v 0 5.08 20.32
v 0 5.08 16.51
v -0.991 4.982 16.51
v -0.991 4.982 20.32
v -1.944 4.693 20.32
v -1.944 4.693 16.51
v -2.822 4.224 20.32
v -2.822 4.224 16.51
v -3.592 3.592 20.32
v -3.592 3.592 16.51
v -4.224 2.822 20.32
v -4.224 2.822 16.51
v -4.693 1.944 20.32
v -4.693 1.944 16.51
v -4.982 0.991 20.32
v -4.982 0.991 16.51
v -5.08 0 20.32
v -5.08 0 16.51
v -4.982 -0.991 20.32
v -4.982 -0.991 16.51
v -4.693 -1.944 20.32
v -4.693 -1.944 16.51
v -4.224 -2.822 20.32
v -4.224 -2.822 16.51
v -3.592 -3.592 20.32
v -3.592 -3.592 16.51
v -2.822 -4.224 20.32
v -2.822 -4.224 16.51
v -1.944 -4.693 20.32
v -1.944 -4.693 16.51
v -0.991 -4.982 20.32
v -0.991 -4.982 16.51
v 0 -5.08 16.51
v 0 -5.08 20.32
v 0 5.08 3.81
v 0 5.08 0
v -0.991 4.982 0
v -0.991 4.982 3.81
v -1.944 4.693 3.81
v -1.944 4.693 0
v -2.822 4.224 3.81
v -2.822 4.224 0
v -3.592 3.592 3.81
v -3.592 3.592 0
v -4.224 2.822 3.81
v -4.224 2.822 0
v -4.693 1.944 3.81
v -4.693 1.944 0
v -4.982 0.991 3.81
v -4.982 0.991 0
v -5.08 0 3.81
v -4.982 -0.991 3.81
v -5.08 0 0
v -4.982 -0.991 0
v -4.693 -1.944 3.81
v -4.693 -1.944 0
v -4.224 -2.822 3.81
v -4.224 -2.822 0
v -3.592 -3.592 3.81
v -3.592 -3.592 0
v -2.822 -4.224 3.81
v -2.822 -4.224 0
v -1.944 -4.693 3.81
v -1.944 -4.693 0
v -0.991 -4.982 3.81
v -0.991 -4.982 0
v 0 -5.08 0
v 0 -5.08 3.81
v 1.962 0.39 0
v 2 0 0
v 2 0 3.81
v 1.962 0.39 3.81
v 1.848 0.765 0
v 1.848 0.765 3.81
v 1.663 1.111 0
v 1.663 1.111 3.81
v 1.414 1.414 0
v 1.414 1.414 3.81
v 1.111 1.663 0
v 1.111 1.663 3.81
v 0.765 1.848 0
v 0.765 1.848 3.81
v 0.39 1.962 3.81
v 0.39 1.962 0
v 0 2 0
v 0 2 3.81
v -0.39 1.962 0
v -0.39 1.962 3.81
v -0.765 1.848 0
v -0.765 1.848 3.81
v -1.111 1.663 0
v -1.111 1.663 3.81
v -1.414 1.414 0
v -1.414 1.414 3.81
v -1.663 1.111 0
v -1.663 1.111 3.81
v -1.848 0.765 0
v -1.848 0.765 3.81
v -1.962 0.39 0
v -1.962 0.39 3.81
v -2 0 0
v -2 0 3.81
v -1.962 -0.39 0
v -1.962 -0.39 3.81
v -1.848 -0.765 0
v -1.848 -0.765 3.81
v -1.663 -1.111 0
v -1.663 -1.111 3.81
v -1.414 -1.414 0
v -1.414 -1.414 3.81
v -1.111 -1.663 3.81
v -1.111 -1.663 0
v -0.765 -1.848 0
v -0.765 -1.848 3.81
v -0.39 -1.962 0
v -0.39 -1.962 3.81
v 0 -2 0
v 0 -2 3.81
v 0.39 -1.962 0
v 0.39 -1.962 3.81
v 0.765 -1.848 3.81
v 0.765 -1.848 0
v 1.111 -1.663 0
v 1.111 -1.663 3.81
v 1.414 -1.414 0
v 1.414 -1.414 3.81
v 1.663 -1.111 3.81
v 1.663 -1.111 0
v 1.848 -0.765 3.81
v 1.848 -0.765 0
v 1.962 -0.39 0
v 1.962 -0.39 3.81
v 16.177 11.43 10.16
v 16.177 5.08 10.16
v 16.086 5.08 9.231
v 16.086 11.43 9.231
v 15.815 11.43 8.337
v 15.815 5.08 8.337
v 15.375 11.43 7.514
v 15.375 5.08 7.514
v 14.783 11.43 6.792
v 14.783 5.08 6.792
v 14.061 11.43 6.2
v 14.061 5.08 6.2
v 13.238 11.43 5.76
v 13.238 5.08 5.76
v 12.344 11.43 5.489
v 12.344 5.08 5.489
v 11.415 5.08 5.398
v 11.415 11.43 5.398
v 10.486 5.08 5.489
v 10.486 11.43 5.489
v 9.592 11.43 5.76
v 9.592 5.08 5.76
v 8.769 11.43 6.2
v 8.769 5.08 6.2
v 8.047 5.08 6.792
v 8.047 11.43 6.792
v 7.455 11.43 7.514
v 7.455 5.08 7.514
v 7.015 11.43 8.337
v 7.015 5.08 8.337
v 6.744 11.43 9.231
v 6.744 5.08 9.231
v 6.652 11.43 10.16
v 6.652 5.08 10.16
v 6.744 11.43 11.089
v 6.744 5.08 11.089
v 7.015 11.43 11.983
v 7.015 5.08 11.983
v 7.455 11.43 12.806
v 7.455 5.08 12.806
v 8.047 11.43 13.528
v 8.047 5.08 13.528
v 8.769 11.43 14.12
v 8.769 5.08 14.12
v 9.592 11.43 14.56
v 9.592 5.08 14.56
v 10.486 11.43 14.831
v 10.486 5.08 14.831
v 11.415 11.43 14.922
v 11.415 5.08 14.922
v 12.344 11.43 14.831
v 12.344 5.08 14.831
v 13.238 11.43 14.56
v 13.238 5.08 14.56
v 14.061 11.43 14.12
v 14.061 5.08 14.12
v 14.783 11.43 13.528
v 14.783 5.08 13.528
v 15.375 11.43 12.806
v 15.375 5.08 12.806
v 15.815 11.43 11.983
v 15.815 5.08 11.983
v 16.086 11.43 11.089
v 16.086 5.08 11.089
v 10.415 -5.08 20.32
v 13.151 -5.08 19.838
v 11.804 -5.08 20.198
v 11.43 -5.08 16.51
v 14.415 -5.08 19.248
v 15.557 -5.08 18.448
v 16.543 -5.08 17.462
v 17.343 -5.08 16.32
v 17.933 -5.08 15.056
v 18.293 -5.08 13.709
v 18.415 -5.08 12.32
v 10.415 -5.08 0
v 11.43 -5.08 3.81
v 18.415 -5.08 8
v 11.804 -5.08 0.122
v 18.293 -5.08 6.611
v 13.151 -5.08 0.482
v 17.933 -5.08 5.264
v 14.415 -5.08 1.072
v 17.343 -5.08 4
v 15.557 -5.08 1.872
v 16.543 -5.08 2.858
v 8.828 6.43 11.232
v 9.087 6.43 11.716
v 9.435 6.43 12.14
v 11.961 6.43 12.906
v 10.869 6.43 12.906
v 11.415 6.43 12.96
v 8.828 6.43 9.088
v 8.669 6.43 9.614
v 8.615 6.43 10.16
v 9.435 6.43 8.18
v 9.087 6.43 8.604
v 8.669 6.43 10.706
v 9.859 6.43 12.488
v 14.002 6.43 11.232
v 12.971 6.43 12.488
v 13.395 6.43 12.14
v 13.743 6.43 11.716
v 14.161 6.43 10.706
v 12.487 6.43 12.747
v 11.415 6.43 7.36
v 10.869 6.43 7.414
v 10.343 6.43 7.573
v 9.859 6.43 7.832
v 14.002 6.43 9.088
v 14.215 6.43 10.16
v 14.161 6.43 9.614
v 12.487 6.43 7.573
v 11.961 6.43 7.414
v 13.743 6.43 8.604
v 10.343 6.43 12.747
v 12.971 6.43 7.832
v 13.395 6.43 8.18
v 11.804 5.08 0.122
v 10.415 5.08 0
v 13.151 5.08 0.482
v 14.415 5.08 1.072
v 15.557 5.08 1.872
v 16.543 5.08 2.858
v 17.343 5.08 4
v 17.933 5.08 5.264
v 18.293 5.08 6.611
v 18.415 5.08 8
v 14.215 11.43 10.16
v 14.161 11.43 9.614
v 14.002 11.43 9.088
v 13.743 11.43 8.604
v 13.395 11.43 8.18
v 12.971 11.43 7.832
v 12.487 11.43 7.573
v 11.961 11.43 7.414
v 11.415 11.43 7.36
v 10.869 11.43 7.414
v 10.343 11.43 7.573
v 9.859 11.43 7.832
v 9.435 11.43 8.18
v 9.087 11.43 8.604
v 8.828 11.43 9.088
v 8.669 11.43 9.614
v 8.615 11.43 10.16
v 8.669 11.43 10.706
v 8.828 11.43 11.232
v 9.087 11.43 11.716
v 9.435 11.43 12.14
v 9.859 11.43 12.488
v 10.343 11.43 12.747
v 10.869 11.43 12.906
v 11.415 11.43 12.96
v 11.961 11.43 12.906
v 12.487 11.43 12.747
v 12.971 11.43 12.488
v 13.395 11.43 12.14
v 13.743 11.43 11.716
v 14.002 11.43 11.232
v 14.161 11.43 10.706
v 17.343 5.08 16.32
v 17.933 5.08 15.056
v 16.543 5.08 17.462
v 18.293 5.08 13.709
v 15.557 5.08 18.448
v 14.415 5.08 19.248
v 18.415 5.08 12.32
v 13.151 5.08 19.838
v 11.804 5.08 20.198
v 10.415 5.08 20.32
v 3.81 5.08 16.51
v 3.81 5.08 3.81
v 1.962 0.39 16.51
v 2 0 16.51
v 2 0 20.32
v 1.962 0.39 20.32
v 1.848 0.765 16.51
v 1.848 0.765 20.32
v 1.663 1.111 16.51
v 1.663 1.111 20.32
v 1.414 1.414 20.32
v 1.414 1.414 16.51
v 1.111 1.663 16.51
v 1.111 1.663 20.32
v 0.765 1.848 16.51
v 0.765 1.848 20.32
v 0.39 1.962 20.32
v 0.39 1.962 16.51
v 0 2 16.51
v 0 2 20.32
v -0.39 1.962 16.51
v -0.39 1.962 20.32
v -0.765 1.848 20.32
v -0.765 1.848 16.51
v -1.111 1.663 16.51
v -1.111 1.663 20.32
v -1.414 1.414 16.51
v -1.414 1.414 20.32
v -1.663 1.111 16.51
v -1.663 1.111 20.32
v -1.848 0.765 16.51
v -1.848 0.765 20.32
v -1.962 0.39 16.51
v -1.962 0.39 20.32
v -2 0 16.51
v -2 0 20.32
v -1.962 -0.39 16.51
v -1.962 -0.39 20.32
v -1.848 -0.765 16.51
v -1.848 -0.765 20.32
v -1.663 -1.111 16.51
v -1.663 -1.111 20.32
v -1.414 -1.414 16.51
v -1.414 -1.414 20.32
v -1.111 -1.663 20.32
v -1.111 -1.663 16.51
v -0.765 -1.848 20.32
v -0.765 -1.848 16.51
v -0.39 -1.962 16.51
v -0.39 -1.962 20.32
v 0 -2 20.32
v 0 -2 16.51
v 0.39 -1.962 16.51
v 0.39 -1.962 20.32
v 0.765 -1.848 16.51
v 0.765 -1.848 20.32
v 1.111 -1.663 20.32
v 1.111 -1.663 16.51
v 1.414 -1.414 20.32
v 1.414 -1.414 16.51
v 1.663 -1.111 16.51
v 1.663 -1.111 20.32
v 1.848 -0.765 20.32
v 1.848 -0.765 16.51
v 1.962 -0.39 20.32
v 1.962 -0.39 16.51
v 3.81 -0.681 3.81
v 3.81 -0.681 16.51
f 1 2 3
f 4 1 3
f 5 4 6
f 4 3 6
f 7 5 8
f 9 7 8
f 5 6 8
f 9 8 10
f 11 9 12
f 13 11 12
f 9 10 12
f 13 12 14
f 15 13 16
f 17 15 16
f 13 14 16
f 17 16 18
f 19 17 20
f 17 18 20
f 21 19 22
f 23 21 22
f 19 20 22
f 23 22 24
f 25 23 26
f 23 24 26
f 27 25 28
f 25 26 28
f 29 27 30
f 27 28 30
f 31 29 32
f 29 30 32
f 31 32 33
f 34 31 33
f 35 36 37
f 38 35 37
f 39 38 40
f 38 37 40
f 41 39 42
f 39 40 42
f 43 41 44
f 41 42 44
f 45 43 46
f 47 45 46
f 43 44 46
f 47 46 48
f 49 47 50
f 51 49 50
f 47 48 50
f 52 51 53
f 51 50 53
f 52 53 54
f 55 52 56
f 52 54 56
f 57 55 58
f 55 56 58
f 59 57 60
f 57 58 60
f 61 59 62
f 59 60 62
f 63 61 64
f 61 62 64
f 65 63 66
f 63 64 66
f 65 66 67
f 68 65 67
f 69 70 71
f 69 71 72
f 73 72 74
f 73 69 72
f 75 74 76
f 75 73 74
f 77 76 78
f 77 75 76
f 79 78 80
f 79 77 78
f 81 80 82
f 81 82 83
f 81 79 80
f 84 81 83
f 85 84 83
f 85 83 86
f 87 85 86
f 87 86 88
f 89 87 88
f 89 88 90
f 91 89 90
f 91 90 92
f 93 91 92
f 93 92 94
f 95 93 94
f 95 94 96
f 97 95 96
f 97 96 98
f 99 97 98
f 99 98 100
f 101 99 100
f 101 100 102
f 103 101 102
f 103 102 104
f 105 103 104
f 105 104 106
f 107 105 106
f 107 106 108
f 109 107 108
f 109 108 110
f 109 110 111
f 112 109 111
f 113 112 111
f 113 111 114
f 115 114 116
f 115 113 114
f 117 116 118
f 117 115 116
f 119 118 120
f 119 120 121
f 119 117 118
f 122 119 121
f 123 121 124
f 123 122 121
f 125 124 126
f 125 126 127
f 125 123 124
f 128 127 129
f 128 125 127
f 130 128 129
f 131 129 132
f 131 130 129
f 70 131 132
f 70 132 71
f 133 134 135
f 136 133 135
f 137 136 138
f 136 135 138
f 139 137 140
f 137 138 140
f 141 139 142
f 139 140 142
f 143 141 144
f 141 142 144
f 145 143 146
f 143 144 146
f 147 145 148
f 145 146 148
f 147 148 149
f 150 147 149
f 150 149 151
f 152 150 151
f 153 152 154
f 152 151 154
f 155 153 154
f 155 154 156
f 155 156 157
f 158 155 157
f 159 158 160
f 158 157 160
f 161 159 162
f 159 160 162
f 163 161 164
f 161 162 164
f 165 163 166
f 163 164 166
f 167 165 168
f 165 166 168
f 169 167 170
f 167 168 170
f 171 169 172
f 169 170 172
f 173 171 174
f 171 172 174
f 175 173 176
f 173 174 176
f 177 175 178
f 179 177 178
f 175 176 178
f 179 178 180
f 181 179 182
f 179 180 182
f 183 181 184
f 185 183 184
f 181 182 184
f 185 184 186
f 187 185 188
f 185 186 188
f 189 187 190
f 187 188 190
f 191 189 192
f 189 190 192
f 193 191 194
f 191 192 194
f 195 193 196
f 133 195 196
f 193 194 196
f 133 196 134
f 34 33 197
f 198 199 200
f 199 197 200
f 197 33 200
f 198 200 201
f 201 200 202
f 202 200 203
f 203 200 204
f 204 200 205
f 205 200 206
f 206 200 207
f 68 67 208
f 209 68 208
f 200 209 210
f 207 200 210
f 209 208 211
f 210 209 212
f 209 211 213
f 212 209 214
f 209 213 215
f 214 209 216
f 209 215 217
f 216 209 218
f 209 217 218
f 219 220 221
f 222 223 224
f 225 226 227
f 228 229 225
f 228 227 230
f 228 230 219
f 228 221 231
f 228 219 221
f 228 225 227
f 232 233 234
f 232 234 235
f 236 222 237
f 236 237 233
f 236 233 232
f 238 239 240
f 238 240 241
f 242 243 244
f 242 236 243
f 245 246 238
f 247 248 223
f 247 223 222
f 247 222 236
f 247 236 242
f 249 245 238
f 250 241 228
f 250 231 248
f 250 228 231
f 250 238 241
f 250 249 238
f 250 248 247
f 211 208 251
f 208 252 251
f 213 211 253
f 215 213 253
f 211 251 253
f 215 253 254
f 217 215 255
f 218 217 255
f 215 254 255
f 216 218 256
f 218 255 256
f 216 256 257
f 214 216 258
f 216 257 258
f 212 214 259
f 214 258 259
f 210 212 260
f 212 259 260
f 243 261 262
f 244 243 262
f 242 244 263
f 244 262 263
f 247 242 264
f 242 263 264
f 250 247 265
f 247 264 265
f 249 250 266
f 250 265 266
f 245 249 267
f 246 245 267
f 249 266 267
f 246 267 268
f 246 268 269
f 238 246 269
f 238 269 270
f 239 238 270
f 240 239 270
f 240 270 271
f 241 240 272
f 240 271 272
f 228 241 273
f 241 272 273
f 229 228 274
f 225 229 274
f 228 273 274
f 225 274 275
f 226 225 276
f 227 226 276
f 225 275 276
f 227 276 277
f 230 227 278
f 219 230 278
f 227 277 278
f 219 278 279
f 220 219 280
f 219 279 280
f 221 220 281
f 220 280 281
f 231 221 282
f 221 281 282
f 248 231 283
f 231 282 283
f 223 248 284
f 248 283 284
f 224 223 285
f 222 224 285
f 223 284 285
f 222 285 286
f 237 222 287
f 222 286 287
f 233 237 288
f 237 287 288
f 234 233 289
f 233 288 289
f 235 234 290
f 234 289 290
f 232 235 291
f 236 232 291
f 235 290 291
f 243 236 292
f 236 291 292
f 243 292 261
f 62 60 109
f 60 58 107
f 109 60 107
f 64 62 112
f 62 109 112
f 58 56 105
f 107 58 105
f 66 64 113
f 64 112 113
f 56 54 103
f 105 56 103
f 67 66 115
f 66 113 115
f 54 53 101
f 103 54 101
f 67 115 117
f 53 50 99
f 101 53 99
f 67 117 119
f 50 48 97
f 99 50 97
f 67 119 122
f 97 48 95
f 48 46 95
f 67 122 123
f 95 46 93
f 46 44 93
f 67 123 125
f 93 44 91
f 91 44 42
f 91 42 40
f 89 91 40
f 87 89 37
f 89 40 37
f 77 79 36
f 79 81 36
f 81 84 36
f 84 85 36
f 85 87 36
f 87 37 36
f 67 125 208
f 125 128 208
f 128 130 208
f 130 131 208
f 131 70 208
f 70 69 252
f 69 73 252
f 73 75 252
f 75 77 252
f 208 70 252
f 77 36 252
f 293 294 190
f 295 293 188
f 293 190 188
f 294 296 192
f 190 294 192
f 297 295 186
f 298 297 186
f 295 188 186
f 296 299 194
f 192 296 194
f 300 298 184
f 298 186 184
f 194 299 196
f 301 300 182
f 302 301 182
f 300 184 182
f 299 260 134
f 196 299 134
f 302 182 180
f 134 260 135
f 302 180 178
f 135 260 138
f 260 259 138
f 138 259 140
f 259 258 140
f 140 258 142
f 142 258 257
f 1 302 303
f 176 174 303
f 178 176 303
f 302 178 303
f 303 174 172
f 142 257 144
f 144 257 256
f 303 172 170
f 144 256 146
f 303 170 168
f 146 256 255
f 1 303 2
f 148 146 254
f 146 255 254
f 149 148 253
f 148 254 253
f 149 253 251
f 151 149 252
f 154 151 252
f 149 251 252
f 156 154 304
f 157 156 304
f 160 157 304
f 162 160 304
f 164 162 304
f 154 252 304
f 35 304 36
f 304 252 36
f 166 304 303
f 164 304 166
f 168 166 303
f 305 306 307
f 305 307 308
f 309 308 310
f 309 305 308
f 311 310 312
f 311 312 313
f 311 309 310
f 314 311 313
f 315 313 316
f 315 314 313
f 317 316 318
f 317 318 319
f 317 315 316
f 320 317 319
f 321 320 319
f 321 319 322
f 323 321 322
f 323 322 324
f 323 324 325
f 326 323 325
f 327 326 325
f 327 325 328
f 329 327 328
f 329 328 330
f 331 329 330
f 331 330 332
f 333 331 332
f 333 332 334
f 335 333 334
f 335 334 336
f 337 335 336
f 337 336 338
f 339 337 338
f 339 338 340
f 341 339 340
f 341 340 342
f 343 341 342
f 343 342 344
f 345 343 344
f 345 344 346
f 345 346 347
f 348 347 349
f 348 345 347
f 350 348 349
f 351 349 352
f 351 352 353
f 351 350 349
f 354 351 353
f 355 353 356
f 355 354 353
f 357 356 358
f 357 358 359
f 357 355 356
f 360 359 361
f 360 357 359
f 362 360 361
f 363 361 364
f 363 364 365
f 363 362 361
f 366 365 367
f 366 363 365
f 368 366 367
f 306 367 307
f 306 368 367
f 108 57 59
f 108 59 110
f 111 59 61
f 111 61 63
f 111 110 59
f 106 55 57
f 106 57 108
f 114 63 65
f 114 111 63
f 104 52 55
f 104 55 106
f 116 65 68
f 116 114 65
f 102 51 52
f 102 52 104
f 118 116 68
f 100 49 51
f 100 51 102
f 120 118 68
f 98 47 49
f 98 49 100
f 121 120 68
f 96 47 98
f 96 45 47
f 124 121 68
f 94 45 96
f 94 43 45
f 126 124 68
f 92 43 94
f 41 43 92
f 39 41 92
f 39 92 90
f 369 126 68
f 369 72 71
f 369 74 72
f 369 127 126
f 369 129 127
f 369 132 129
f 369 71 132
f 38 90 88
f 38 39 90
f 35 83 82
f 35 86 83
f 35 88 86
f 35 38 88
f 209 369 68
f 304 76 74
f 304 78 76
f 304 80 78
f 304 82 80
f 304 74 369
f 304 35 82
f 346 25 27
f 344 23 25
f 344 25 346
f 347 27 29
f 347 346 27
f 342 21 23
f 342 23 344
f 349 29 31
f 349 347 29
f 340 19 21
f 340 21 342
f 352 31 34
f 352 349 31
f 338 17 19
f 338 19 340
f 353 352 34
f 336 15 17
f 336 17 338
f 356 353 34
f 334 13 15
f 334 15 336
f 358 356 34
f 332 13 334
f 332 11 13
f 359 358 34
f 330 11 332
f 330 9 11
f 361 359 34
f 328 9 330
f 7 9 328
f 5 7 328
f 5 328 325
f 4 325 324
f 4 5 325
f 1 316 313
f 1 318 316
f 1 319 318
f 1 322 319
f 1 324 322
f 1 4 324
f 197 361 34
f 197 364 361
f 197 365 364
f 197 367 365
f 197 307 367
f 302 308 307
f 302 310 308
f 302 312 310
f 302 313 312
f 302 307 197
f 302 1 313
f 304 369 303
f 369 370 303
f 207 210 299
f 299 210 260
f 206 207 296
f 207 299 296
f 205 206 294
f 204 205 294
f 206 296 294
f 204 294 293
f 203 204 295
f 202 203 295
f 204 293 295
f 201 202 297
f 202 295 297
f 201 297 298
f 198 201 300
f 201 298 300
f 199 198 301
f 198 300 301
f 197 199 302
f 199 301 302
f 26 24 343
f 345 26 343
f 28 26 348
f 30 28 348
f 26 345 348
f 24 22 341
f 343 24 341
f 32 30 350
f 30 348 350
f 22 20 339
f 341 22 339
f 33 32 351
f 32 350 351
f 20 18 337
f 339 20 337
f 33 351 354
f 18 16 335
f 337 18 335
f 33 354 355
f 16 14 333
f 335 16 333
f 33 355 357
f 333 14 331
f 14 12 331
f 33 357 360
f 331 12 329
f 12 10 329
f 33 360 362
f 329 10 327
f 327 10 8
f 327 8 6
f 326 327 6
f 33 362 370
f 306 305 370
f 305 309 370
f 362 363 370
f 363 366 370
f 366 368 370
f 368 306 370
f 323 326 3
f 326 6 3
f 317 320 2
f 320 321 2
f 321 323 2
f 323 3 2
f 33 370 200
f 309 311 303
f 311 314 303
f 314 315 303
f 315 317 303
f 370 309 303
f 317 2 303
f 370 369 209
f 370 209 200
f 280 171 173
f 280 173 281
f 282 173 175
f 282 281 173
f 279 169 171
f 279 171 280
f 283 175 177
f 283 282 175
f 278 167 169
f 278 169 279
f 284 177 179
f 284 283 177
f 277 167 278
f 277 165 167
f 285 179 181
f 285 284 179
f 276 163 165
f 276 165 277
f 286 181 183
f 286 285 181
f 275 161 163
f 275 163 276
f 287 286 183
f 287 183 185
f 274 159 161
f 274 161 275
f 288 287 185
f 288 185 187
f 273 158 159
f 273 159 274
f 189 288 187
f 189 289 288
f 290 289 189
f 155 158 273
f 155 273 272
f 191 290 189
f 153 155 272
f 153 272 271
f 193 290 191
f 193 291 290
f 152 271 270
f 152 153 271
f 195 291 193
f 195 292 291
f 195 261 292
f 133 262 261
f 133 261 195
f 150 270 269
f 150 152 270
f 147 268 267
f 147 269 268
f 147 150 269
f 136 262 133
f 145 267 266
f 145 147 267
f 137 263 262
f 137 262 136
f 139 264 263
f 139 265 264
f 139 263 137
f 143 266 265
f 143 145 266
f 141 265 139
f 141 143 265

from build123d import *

# Parameters (mm, degrees)
SKETCH2_R           = 2
BOSS_EXTRUDE1_DEPTH = 20.32
SKETCH3_R           = 2
CUT_EXTRUDE1_DEPTH  = 6.35
SKETCH6_R           = 4.7625
BOSS_EXTRUDE2_DEPTH = 6.35
SKETCH7_R           = 2.8
CUT_EXTRUDE3_DEPTH  = 5
CHAMFER3_SIZE       = 7.62
CHAMFER3_SIZE2      = 4.399409051
FILLET1_R           = 8


with BuildPart() as part:
    # Sketch2 → Boss-Extrude1 (new body)
    with BuildSketch(Plane.XY):
        with BuildLine():
            ThreePointArc((0, 5.08), (-5.08, 0), (0, -5.08))
            Line((0, -5.08), (18.415, -5.08))
            Line((18.415, -5.08), (18.415, 5.08))
            Line((18.415, 5.08), (0, 5.08))
        make_face()
        Circle(SKETCH2_R, mode=Mode.SUBTRACT)
    extrude(amount=BOSS_EXTRUDE1_DEPTH)

    # Sketch3 → Cut-Extrude1 (cut, symmetric)
    with BuildSketch(Plane.XY.offset(10.16)):
        with BuildLine():
            ThreePointArc((0, 5.08), (-5.08, 0), (0, -5.08))
            ThreePointArc((0, -5.08), (2.090104165, -4.630104165), (3.81, -3.360104165))
            Line((3.81, -3.360104165), (3.81, 3.360104165))
            ThreePointArc((3.81, 3.360104165), (2.090104165, 4.630104165), (0, 5.08))
        make_face()
        Circle(SKETCH3_R, mode=Mode.SUBTRACT)
        with BuildLine():
            Line((3.81, 5.08), (0, 5.08))
            ThreePointArc((0, 5.08), (2.090104165, 4.630104165), (3.81, 3.360104165))
            Line((3.81, 3.360104165), (3.81, 5.08))
        make_face()
        with BuildLine():
            Line((0, -5.08), (3.81, -5.08))
            Line((3.81, -5.08), (3.81, -3.360104165))
            ThreePointArc((3.81, -3.360104165), (2.090104165, -4.630104165), (0, -5.08))
        make_face()
    extrude(amount=CUT_EXTRUDE1_DEPTH, both=True, mode=Mode.SUBTRACT)

    # Sketch6 → Boss-Extrude2 (add)
    with BuildSketch(Plane(origin=(0, 5.08, 0), x_dir=(1, 0, 0), z_dir=(0, 1, 0))):
        with Locations((11.415, -10.16)):
            Circle(SKETCH6_R)
    extrude(amount=BOSS_EXTRUDE2_DEPTH)

    # Sketch7 → Cut-Extrude3 (cut)
    with BuildSketch(Plane(origin=(0, 11.43, 0), x_dir=(1, 0, 0), z_dir=(0, 1, 0))):
        with Locations((11.415, -10.16)):
            Circle(SKETCH7_R)
    extrude(amount=-CUT_EXTRUDE3_DEPTH, mode=Mode.SUBTRACT)

    # Chamfer3
    chamfer3_edges = [part.edges().sort_by_distance(p)[0] for p in [
        (3.81, -5.08, 10.16),
    ]]
    chamfer3_side = [part.faces().sort_by_distance(p)[0] for p in [
        (10.292029703, -5.08, 10.16),
    ]]
    chamfer(chamfer3_edges, length=CHAMFER3_SIZE, length2=CHAMFER3_SIZE2, reference=chamfer3_side[0])

    # Fillet1
    fillet1_edges = [part.edges().sort_by_distance(p)[0] for p in [
        (18.415, 0, 20.32),
        (18.415, 0, 0),
    ]]
    fillet(fillet1_edges, radius=FILLET1_R)


solid = part.part
